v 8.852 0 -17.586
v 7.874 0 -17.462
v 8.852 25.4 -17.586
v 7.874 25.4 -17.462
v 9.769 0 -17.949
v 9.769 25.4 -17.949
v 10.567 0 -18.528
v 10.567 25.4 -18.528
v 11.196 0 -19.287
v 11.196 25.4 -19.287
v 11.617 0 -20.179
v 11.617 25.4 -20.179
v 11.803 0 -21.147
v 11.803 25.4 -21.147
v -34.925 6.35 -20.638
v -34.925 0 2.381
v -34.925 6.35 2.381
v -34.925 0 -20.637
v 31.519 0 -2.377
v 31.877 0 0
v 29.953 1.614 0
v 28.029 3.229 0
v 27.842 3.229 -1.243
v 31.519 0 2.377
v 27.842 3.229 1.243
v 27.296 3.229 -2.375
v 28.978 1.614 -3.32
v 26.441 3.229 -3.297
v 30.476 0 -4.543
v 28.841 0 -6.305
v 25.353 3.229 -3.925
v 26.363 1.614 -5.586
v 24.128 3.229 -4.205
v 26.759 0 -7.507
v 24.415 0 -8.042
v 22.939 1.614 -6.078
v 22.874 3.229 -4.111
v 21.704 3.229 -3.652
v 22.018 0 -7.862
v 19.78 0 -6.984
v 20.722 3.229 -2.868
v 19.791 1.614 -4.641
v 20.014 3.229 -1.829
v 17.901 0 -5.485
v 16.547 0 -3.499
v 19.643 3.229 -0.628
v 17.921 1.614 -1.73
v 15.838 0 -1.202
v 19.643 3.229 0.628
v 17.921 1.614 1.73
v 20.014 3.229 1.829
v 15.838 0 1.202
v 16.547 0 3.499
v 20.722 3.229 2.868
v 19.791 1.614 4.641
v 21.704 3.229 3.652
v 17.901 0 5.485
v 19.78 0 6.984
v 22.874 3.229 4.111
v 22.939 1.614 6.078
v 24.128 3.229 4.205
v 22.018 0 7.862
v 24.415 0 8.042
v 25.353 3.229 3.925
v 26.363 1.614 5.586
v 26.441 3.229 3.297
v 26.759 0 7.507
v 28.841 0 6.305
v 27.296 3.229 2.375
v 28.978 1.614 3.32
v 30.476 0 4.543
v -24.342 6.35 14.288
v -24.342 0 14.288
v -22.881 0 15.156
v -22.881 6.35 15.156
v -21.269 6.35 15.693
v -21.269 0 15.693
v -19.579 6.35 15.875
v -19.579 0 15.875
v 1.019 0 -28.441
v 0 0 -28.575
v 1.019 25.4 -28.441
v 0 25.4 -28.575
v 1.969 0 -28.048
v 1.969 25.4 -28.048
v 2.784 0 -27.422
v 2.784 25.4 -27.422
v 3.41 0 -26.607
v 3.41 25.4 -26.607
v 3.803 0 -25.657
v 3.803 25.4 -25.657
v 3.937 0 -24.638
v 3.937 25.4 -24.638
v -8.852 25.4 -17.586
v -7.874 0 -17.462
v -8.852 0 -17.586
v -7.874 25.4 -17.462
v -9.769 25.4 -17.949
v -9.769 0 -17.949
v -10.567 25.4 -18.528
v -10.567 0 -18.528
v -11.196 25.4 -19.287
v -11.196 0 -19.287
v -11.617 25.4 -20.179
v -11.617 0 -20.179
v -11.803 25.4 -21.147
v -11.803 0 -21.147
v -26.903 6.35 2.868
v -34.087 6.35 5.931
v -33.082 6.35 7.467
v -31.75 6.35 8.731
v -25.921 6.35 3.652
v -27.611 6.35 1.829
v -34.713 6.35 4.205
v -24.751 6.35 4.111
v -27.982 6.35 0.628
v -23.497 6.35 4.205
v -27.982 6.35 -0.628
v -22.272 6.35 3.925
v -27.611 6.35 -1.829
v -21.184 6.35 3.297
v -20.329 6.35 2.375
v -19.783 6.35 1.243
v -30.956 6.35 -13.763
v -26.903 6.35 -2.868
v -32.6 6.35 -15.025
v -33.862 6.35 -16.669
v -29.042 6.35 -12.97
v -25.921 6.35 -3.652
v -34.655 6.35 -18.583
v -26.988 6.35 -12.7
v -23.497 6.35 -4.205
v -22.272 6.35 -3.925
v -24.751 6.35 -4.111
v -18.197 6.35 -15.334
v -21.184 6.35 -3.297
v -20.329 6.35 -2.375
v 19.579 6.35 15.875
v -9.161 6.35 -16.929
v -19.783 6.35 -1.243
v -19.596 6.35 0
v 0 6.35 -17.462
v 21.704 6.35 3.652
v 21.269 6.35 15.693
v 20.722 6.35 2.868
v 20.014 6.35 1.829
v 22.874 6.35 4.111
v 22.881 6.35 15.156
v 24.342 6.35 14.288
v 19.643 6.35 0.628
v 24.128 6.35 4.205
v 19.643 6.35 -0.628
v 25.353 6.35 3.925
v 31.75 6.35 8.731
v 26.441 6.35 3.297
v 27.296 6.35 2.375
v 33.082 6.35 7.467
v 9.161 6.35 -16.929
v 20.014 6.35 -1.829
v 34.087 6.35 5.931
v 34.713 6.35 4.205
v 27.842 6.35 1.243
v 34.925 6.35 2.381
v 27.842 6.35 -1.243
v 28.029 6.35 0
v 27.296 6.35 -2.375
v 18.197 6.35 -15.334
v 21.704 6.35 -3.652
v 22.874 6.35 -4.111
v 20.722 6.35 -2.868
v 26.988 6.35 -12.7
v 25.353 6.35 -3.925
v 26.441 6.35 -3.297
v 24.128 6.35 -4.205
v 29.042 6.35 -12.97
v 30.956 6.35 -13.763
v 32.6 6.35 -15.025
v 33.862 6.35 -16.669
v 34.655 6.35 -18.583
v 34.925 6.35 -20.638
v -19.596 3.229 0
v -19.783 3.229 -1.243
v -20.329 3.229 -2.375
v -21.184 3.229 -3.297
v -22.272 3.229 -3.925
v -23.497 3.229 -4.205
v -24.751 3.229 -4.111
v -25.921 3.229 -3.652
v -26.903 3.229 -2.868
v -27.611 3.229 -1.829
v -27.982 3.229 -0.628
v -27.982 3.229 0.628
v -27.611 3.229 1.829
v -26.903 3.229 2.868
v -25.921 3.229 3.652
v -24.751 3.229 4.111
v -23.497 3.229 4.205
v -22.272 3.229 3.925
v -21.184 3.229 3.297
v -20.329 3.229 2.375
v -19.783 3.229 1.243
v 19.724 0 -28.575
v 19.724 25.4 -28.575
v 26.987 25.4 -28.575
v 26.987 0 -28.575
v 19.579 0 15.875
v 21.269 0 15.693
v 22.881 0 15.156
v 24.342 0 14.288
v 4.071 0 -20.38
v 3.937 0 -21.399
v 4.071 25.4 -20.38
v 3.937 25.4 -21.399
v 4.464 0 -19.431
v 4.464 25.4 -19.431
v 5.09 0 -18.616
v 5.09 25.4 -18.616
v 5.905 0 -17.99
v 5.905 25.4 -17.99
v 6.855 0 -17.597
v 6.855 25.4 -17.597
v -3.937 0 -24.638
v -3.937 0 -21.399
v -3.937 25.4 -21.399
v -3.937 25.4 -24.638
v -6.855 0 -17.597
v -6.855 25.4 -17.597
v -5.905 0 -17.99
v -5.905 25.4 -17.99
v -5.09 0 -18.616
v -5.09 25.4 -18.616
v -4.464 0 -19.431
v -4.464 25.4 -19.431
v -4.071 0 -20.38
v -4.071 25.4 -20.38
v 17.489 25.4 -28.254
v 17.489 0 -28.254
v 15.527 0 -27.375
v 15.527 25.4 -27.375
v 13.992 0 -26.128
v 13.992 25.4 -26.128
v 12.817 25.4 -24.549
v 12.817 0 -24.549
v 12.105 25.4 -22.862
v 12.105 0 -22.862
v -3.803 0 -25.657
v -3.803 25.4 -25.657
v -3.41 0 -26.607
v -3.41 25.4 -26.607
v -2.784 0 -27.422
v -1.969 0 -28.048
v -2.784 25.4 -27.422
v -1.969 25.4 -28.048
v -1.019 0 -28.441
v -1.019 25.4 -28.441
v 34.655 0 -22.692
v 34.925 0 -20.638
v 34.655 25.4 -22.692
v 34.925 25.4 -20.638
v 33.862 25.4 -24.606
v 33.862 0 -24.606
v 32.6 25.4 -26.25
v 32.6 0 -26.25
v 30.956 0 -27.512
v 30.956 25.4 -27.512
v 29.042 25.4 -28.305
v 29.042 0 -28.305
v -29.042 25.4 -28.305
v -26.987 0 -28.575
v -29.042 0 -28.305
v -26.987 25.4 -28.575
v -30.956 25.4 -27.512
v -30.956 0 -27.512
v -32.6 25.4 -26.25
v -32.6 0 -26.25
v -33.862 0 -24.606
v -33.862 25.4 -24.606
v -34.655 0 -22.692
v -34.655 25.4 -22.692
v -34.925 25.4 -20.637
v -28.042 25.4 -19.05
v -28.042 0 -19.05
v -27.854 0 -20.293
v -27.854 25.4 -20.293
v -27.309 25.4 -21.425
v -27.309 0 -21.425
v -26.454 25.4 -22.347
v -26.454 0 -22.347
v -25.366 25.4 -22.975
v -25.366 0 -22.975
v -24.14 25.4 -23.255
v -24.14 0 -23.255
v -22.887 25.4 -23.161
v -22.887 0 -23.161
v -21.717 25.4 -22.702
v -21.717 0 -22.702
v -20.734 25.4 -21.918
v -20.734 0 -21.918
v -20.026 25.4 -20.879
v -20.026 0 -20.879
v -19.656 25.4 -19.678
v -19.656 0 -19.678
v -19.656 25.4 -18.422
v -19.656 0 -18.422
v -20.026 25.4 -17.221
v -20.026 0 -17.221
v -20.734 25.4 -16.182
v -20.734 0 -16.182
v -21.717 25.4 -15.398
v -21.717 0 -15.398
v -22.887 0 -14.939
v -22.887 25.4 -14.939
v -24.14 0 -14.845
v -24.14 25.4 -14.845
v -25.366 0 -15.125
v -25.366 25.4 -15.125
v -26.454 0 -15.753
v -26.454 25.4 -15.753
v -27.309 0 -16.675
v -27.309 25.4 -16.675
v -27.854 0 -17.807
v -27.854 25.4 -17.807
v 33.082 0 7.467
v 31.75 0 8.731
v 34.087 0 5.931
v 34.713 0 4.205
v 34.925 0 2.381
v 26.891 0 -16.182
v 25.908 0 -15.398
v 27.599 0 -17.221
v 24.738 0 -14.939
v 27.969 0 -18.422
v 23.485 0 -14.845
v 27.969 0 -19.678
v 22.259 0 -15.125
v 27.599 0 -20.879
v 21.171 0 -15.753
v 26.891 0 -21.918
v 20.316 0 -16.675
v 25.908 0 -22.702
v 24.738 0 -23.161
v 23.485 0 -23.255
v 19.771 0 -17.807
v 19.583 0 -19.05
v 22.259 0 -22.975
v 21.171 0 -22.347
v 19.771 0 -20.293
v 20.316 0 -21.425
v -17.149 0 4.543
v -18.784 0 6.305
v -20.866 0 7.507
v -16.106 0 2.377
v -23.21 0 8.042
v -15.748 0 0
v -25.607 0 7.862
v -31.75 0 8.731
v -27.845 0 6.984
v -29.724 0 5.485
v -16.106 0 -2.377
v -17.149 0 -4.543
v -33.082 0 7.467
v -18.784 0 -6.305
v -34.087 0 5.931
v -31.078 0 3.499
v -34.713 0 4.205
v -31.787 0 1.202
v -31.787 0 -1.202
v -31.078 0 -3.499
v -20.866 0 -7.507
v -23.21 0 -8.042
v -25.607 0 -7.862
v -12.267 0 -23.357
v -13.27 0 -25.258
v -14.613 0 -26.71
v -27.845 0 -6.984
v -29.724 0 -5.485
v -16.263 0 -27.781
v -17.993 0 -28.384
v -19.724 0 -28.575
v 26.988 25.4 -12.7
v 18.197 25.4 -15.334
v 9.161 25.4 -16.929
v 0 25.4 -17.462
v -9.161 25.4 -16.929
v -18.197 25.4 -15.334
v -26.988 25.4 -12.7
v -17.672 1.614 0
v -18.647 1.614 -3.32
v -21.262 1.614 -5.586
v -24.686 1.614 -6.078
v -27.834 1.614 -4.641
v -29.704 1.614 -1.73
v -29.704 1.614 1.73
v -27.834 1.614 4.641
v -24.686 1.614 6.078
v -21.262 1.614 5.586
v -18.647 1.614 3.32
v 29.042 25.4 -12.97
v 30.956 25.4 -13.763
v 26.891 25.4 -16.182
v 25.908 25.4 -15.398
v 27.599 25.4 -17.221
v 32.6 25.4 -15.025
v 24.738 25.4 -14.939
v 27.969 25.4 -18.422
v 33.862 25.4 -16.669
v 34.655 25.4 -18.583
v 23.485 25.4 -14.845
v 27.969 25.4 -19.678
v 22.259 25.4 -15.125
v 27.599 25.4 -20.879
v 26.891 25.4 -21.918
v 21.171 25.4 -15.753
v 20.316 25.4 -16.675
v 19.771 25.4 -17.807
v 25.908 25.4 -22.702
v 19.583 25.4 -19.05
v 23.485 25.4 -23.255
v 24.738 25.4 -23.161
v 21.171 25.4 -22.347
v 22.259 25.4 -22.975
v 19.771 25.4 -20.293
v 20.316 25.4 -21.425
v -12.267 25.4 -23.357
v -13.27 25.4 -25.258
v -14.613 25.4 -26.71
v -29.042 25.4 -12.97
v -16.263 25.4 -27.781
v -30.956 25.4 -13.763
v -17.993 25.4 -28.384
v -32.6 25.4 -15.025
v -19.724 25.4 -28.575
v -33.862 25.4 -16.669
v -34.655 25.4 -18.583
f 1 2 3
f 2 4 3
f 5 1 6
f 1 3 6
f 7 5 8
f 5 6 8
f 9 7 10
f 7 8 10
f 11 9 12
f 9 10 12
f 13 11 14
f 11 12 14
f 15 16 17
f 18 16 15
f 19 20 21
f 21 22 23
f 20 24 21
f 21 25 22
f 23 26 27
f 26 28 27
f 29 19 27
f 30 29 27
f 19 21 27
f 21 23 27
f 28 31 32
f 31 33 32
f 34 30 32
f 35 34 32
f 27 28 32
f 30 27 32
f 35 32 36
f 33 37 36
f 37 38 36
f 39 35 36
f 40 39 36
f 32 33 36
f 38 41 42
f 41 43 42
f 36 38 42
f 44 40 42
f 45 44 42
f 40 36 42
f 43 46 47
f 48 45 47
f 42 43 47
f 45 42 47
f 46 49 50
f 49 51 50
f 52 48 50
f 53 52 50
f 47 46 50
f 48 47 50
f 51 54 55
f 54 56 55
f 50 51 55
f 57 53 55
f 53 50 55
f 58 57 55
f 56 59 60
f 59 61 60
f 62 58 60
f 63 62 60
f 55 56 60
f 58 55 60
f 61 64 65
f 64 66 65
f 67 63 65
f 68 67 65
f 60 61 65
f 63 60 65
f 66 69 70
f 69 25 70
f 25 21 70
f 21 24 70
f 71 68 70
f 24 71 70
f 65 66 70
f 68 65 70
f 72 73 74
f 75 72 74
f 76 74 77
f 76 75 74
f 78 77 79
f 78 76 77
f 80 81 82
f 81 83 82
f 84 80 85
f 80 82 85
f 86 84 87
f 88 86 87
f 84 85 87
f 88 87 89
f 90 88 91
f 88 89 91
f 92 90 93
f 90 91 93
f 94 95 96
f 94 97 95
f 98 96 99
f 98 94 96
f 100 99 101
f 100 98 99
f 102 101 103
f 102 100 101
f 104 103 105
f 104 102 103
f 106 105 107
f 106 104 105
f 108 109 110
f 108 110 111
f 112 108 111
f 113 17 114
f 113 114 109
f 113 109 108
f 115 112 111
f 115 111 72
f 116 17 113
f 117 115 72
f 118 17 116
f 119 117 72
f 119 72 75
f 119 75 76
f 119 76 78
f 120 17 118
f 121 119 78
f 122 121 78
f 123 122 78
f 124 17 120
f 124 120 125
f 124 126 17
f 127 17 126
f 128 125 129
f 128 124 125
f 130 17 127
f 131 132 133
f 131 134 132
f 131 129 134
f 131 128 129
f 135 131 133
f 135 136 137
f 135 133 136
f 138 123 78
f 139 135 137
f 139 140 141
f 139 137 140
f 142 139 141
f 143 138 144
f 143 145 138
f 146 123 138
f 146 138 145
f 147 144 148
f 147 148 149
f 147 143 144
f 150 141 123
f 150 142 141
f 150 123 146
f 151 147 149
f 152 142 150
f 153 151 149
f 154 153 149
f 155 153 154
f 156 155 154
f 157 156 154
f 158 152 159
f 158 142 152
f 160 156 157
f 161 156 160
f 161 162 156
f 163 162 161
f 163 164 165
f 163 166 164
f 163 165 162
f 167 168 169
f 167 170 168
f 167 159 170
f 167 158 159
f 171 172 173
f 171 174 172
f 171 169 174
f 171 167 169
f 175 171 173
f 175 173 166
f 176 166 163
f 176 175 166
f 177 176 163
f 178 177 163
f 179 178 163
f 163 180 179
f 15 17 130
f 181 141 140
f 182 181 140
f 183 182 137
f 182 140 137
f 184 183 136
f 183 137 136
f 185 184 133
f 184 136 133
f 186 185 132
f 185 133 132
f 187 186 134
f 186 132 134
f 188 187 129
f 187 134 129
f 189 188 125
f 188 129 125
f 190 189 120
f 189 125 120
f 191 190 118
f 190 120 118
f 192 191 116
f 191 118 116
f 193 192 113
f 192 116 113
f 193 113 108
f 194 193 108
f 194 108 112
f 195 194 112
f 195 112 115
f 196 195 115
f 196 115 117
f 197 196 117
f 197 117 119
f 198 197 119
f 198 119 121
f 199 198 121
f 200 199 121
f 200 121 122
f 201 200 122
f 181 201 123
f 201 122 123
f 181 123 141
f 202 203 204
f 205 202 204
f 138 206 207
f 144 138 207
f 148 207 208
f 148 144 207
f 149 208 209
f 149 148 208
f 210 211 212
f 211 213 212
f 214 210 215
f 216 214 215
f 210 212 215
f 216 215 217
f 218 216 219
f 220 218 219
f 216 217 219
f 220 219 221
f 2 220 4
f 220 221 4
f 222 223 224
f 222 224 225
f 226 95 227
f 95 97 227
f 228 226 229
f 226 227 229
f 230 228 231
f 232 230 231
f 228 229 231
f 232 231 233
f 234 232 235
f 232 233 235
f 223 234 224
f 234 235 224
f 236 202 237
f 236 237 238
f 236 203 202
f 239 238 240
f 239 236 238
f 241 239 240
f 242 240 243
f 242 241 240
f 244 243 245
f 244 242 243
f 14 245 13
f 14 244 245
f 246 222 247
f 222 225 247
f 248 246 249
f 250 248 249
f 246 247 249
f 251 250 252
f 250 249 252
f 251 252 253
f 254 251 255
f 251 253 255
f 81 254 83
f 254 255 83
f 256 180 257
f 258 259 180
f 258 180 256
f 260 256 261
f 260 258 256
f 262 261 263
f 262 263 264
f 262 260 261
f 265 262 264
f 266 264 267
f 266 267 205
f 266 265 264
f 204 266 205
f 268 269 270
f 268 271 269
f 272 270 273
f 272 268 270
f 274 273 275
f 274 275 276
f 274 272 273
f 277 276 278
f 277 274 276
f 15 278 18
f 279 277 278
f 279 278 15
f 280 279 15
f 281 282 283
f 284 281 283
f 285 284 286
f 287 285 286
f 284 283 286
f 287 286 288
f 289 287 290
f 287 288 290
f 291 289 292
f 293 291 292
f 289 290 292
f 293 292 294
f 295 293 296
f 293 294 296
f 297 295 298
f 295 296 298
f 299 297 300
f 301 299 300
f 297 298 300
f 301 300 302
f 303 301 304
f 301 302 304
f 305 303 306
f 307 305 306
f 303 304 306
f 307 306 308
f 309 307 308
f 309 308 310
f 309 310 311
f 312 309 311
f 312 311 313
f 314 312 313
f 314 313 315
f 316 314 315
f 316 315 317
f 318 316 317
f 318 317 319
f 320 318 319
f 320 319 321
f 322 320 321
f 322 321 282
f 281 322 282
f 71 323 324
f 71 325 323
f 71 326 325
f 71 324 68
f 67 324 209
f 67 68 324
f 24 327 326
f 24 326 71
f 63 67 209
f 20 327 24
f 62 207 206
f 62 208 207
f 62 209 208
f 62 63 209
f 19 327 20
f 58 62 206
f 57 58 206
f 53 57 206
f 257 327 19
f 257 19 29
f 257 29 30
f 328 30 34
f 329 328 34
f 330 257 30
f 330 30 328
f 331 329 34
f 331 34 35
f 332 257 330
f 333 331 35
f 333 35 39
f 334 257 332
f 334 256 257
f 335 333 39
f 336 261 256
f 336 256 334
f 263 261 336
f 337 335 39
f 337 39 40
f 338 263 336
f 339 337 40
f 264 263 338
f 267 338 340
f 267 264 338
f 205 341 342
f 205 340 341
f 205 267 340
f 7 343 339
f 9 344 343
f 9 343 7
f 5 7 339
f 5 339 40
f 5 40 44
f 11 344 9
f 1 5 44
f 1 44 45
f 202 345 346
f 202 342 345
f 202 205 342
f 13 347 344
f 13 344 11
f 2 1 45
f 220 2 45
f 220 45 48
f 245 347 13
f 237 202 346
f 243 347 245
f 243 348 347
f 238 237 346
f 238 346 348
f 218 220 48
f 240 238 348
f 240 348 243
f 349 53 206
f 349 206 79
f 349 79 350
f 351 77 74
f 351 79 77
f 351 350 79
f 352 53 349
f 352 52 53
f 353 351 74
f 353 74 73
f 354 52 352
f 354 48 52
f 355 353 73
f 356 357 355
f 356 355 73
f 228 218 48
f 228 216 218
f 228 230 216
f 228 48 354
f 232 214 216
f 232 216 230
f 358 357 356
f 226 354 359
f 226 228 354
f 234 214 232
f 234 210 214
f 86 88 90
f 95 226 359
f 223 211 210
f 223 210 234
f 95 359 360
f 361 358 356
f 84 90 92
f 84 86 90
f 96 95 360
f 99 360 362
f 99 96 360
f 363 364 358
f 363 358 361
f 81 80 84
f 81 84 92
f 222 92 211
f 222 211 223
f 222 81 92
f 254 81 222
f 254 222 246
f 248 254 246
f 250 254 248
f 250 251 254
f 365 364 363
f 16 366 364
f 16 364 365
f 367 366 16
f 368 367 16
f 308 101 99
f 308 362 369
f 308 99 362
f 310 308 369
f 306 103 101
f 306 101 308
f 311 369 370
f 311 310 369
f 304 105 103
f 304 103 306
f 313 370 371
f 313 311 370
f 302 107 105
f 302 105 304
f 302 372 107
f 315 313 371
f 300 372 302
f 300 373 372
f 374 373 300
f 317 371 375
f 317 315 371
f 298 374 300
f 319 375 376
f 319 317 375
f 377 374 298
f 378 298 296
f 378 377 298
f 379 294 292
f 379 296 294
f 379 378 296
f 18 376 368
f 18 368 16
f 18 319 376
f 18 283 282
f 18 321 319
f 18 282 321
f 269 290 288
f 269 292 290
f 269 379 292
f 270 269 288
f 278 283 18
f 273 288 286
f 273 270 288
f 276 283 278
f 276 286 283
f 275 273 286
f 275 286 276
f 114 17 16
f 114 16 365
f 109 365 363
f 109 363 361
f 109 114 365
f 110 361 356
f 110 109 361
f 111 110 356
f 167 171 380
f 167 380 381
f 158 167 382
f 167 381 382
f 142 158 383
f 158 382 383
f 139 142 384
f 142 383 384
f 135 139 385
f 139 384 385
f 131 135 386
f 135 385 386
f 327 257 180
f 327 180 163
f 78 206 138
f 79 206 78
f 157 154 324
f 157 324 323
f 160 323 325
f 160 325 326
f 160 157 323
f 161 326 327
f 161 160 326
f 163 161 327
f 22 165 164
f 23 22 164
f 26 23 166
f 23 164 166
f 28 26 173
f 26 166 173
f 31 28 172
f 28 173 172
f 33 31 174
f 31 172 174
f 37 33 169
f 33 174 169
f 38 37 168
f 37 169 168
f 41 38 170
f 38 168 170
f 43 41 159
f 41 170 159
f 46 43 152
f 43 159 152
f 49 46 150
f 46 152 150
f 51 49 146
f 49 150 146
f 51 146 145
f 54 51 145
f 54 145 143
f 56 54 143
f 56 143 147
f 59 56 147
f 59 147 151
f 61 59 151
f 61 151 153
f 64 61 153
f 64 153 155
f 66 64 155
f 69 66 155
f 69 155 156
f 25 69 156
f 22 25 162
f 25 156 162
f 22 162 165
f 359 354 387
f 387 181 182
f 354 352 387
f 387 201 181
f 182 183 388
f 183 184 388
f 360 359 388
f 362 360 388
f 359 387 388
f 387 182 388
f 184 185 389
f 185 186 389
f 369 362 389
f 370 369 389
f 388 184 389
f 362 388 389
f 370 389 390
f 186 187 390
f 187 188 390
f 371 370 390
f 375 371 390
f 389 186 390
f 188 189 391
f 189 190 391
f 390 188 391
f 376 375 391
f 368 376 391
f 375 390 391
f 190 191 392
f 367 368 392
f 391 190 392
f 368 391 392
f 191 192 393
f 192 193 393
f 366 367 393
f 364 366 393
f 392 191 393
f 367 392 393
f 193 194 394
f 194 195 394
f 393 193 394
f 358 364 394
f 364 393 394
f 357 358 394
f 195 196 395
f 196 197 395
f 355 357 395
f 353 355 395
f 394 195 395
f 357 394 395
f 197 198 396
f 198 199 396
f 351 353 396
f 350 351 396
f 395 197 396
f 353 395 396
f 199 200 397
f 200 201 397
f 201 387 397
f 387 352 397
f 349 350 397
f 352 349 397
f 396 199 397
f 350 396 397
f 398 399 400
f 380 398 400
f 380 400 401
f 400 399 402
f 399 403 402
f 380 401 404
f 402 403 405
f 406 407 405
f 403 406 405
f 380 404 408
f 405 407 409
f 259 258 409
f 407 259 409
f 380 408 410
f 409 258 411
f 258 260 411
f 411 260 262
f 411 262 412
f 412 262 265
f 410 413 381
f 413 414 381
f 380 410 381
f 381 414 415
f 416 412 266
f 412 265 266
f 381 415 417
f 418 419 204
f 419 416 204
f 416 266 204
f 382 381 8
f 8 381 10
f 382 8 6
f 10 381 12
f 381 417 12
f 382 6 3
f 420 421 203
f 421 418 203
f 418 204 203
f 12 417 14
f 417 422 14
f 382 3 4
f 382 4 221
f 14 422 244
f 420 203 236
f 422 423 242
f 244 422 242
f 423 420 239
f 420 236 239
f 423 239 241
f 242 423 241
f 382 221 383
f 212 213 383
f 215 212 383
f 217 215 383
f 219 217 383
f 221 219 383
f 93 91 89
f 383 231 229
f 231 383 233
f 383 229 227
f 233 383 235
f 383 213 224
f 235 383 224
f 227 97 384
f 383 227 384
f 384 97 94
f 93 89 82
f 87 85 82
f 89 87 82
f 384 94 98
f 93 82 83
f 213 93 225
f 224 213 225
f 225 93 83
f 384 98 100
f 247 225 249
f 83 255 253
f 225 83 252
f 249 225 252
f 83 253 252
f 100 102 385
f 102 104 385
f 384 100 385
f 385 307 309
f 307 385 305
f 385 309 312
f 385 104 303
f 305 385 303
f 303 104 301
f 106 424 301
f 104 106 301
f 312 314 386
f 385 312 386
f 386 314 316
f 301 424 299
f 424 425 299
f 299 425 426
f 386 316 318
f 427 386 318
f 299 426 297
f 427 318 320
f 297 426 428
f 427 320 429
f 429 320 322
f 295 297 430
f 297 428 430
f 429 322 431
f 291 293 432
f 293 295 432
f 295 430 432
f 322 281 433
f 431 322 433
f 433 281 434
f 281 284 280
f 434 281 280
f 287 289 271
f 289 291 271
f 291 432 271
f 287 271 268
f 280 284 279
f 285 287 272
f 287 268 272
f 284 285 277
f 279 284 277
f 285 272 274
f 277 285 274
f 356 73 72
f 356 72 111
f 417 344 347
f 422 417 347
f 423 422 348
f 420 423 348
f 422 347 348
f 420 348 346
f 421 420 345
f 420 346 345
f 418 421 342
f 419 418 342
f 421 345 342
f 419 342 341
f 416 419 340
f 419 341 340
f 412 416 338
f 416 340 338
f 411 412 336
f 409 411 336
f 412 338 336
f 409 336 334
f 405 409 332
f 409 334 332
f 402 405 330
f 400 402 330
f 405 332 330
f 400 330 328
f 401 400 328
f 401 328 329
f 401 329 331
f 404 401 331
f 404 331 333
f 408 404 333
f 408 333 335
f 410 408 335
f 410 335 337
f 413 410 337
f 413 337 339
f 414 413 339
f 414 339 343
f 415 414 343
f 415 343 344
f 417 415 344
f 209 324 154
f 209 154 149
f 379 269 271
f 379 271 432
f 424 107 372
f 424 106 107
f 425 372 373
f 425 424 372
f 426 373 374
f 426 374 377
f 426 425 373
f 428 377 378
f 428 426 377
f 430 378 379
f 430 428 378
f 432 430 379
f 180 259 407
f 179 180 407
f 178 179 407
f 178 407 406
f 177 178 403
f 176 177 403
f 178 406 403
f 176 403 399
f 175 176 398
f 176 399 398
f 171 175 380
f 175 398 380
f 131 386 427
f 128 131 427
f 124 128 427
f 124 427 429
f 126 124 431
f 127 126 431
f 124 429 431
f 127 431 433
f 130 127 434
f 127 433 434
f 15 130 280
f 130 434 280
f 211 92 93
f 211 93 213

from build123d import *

# Parameters (mm, degrees)
BOSS_EXTRUDE1_DEPTH                                 = 25.4
FILLET1_R                                           = 3.937
FILLET2_R                                           = 7.9375
F_5_16_CLEARANCE_HOLE1_D                            = 8.4328
CSK_FOR_5_16_FLAT_HEAD_MACHINE_SCREW_10_D           = 8.4328
CSK_FOR_5_16_FLAT_HEAD_MACHINE_SCREW_10_CSINK_D     = 16.129
CSK_FOR_5_16_FLAT_HEAD_MACHINE_SCREW_10_CSINK_ANGLE = 100
CUT_EXTRUDE2_DEPTH                                  = 19.05


with BuildPart() as part:
    # Sketch2 → Boss-Extrude1 (new body)
    with BuildSketch(Plane(origin=(0, 0, 0), x_dir=(1, 0, 0), z_dir=(0, 1, 0))):
        Polygon((-11.811, 17.4625), (-3.937, 17.4625), (-3.937, 28.575), (3.937, 28.575), (3.937, 17.4625), (11.811, 17.4625), (11.811, 28.575), (34.925, 28.575), (34.925, -6.35), (22.225, -15.875), (-22.225, -15.875), (-34.925, -6.35), (-34.925, 28.575), (-11.811, 28.575), align=None)
    extrude(amount=BOSS_EXTRUDE1_DEPTH)

    # Fillet1
    fillet1_edges = [part.edges().sort_by_distance(p)[0] for p in [
        (11.811, 12.7, -17.4625),
        (3.937, 12.7, -17.4625),
        (3.937, 12.7, -28.575),
        (-3.937, 12.7, -28.575),
        (-3.937, 12.7, -17.4625),
        (-11.811, 12.7, -17.4625),
    ]]
    fillet(fillet1_edges, radius=FILLET1_R - 0.0001)  # a hair under: the kernel refuses the full size

    # Fillet2
    fillet2_edges = [part.edges().sort_by_distance(p)[0] for p in [
        (34.925, 12.7, 6.35),
        (22.225, 12.7, 15.875),
        (-22.225, 12.7, 15.875),
        (-34.925, 12.7, 6.35),
        (34.925, 12.7, -28.575),
        (11.811, 12.7, -28.575),
        (-11.811, 12.7, -28.575),
        (-34.925, 12.7, -28.575),
    ]]
    fillet(fillet2_edges, radius=FILLET2_R)

    # 5/16 Clearance Hole1 (through all)
    with Locations(Plane(origin=(0, 25.4, 0), x_dir=(1, 0, 0), z_dir=(0, 1, 0))):
        with Locations((-23.8252, 19.05), (23.7998, 19.05)):
            Hole(F_5_16_CLEARANCE_HOLE1_D / 2)

    # CSK for 5/16 Flat Head Machine Screw (100)1 (through all)
    with Locations(Plane(origin=(0, 0, 0), x_dir=(-1, 0, 0), z_dir=(0, -1, 0))):
        with Locations((-23.8125, 0), (23.8125, 0)):
            CounterSinkHole(CSK_FOR_5_16_FLAT_HEAD_MACHINE_SCREW_10_D / 2, CSK_FOR_5_16_FLAT_HEAD_MACHINE_SCREW_10_CSINK_D / 2, counter_sink_angle=CSK_FOR_5_16_FLAT_HEAD_MACHINE_SCREW_10_CSINK_ANGLE)

    # Sketch8 → Cut-Extrude2 (cut)
    with BuildSketch(Plane(origin=(0, 25.4, 0), x_dir=(1, 0, 0), z_dir=(0, 1, 0))):
        with BuildLine():
            Line((24.341666667, -14.2875), (31.75, -8.73125))
            ThreePointArc((31.75, -8.73125), (34.087015829, -5.931007914), (34.925, -2.38125))
            Line((34.925, -2.38125), (34.925, 20.6375))
            ThreePointArc((34.925, 20.6375), (32.600160076, 15.024839924), (26.9875, 12.7))
            ThreePointArc((26.9875, 12.7), (0, 17.4625), (-26.9875, 12.7))
            ThreePointArc((-26.9875, 12.7), (-32.600160076, 15.024839924), (-34.925, 20.6375))
            Line((-34.925, 20.6375), (-34.925, -2.38125))
            ThreePointArc((-34.925, -2.38125), (-34.087015829, -5.931007914), (-31.75, -8.73125))
            Line((-31.75, -8.73125), (-24.341666667, -14.2875))
            ThreePointArc((-24.341666667, -14.2875), (-22.089224559, -15.467673678), (-19.579166667, -15.875))
            Line((-19.579166667, -15.875), (19.579166667, -15.875))
            ThreePointArc((19.579166667, -15.875), (22.089224559, -15.467673678), (24.341666667, -14.2875))
        make_face()
    extrude(amount=-CUT_EXTRUDE2_DEPTH, mode=Mode.SUBTRACT)


solid = part.part
